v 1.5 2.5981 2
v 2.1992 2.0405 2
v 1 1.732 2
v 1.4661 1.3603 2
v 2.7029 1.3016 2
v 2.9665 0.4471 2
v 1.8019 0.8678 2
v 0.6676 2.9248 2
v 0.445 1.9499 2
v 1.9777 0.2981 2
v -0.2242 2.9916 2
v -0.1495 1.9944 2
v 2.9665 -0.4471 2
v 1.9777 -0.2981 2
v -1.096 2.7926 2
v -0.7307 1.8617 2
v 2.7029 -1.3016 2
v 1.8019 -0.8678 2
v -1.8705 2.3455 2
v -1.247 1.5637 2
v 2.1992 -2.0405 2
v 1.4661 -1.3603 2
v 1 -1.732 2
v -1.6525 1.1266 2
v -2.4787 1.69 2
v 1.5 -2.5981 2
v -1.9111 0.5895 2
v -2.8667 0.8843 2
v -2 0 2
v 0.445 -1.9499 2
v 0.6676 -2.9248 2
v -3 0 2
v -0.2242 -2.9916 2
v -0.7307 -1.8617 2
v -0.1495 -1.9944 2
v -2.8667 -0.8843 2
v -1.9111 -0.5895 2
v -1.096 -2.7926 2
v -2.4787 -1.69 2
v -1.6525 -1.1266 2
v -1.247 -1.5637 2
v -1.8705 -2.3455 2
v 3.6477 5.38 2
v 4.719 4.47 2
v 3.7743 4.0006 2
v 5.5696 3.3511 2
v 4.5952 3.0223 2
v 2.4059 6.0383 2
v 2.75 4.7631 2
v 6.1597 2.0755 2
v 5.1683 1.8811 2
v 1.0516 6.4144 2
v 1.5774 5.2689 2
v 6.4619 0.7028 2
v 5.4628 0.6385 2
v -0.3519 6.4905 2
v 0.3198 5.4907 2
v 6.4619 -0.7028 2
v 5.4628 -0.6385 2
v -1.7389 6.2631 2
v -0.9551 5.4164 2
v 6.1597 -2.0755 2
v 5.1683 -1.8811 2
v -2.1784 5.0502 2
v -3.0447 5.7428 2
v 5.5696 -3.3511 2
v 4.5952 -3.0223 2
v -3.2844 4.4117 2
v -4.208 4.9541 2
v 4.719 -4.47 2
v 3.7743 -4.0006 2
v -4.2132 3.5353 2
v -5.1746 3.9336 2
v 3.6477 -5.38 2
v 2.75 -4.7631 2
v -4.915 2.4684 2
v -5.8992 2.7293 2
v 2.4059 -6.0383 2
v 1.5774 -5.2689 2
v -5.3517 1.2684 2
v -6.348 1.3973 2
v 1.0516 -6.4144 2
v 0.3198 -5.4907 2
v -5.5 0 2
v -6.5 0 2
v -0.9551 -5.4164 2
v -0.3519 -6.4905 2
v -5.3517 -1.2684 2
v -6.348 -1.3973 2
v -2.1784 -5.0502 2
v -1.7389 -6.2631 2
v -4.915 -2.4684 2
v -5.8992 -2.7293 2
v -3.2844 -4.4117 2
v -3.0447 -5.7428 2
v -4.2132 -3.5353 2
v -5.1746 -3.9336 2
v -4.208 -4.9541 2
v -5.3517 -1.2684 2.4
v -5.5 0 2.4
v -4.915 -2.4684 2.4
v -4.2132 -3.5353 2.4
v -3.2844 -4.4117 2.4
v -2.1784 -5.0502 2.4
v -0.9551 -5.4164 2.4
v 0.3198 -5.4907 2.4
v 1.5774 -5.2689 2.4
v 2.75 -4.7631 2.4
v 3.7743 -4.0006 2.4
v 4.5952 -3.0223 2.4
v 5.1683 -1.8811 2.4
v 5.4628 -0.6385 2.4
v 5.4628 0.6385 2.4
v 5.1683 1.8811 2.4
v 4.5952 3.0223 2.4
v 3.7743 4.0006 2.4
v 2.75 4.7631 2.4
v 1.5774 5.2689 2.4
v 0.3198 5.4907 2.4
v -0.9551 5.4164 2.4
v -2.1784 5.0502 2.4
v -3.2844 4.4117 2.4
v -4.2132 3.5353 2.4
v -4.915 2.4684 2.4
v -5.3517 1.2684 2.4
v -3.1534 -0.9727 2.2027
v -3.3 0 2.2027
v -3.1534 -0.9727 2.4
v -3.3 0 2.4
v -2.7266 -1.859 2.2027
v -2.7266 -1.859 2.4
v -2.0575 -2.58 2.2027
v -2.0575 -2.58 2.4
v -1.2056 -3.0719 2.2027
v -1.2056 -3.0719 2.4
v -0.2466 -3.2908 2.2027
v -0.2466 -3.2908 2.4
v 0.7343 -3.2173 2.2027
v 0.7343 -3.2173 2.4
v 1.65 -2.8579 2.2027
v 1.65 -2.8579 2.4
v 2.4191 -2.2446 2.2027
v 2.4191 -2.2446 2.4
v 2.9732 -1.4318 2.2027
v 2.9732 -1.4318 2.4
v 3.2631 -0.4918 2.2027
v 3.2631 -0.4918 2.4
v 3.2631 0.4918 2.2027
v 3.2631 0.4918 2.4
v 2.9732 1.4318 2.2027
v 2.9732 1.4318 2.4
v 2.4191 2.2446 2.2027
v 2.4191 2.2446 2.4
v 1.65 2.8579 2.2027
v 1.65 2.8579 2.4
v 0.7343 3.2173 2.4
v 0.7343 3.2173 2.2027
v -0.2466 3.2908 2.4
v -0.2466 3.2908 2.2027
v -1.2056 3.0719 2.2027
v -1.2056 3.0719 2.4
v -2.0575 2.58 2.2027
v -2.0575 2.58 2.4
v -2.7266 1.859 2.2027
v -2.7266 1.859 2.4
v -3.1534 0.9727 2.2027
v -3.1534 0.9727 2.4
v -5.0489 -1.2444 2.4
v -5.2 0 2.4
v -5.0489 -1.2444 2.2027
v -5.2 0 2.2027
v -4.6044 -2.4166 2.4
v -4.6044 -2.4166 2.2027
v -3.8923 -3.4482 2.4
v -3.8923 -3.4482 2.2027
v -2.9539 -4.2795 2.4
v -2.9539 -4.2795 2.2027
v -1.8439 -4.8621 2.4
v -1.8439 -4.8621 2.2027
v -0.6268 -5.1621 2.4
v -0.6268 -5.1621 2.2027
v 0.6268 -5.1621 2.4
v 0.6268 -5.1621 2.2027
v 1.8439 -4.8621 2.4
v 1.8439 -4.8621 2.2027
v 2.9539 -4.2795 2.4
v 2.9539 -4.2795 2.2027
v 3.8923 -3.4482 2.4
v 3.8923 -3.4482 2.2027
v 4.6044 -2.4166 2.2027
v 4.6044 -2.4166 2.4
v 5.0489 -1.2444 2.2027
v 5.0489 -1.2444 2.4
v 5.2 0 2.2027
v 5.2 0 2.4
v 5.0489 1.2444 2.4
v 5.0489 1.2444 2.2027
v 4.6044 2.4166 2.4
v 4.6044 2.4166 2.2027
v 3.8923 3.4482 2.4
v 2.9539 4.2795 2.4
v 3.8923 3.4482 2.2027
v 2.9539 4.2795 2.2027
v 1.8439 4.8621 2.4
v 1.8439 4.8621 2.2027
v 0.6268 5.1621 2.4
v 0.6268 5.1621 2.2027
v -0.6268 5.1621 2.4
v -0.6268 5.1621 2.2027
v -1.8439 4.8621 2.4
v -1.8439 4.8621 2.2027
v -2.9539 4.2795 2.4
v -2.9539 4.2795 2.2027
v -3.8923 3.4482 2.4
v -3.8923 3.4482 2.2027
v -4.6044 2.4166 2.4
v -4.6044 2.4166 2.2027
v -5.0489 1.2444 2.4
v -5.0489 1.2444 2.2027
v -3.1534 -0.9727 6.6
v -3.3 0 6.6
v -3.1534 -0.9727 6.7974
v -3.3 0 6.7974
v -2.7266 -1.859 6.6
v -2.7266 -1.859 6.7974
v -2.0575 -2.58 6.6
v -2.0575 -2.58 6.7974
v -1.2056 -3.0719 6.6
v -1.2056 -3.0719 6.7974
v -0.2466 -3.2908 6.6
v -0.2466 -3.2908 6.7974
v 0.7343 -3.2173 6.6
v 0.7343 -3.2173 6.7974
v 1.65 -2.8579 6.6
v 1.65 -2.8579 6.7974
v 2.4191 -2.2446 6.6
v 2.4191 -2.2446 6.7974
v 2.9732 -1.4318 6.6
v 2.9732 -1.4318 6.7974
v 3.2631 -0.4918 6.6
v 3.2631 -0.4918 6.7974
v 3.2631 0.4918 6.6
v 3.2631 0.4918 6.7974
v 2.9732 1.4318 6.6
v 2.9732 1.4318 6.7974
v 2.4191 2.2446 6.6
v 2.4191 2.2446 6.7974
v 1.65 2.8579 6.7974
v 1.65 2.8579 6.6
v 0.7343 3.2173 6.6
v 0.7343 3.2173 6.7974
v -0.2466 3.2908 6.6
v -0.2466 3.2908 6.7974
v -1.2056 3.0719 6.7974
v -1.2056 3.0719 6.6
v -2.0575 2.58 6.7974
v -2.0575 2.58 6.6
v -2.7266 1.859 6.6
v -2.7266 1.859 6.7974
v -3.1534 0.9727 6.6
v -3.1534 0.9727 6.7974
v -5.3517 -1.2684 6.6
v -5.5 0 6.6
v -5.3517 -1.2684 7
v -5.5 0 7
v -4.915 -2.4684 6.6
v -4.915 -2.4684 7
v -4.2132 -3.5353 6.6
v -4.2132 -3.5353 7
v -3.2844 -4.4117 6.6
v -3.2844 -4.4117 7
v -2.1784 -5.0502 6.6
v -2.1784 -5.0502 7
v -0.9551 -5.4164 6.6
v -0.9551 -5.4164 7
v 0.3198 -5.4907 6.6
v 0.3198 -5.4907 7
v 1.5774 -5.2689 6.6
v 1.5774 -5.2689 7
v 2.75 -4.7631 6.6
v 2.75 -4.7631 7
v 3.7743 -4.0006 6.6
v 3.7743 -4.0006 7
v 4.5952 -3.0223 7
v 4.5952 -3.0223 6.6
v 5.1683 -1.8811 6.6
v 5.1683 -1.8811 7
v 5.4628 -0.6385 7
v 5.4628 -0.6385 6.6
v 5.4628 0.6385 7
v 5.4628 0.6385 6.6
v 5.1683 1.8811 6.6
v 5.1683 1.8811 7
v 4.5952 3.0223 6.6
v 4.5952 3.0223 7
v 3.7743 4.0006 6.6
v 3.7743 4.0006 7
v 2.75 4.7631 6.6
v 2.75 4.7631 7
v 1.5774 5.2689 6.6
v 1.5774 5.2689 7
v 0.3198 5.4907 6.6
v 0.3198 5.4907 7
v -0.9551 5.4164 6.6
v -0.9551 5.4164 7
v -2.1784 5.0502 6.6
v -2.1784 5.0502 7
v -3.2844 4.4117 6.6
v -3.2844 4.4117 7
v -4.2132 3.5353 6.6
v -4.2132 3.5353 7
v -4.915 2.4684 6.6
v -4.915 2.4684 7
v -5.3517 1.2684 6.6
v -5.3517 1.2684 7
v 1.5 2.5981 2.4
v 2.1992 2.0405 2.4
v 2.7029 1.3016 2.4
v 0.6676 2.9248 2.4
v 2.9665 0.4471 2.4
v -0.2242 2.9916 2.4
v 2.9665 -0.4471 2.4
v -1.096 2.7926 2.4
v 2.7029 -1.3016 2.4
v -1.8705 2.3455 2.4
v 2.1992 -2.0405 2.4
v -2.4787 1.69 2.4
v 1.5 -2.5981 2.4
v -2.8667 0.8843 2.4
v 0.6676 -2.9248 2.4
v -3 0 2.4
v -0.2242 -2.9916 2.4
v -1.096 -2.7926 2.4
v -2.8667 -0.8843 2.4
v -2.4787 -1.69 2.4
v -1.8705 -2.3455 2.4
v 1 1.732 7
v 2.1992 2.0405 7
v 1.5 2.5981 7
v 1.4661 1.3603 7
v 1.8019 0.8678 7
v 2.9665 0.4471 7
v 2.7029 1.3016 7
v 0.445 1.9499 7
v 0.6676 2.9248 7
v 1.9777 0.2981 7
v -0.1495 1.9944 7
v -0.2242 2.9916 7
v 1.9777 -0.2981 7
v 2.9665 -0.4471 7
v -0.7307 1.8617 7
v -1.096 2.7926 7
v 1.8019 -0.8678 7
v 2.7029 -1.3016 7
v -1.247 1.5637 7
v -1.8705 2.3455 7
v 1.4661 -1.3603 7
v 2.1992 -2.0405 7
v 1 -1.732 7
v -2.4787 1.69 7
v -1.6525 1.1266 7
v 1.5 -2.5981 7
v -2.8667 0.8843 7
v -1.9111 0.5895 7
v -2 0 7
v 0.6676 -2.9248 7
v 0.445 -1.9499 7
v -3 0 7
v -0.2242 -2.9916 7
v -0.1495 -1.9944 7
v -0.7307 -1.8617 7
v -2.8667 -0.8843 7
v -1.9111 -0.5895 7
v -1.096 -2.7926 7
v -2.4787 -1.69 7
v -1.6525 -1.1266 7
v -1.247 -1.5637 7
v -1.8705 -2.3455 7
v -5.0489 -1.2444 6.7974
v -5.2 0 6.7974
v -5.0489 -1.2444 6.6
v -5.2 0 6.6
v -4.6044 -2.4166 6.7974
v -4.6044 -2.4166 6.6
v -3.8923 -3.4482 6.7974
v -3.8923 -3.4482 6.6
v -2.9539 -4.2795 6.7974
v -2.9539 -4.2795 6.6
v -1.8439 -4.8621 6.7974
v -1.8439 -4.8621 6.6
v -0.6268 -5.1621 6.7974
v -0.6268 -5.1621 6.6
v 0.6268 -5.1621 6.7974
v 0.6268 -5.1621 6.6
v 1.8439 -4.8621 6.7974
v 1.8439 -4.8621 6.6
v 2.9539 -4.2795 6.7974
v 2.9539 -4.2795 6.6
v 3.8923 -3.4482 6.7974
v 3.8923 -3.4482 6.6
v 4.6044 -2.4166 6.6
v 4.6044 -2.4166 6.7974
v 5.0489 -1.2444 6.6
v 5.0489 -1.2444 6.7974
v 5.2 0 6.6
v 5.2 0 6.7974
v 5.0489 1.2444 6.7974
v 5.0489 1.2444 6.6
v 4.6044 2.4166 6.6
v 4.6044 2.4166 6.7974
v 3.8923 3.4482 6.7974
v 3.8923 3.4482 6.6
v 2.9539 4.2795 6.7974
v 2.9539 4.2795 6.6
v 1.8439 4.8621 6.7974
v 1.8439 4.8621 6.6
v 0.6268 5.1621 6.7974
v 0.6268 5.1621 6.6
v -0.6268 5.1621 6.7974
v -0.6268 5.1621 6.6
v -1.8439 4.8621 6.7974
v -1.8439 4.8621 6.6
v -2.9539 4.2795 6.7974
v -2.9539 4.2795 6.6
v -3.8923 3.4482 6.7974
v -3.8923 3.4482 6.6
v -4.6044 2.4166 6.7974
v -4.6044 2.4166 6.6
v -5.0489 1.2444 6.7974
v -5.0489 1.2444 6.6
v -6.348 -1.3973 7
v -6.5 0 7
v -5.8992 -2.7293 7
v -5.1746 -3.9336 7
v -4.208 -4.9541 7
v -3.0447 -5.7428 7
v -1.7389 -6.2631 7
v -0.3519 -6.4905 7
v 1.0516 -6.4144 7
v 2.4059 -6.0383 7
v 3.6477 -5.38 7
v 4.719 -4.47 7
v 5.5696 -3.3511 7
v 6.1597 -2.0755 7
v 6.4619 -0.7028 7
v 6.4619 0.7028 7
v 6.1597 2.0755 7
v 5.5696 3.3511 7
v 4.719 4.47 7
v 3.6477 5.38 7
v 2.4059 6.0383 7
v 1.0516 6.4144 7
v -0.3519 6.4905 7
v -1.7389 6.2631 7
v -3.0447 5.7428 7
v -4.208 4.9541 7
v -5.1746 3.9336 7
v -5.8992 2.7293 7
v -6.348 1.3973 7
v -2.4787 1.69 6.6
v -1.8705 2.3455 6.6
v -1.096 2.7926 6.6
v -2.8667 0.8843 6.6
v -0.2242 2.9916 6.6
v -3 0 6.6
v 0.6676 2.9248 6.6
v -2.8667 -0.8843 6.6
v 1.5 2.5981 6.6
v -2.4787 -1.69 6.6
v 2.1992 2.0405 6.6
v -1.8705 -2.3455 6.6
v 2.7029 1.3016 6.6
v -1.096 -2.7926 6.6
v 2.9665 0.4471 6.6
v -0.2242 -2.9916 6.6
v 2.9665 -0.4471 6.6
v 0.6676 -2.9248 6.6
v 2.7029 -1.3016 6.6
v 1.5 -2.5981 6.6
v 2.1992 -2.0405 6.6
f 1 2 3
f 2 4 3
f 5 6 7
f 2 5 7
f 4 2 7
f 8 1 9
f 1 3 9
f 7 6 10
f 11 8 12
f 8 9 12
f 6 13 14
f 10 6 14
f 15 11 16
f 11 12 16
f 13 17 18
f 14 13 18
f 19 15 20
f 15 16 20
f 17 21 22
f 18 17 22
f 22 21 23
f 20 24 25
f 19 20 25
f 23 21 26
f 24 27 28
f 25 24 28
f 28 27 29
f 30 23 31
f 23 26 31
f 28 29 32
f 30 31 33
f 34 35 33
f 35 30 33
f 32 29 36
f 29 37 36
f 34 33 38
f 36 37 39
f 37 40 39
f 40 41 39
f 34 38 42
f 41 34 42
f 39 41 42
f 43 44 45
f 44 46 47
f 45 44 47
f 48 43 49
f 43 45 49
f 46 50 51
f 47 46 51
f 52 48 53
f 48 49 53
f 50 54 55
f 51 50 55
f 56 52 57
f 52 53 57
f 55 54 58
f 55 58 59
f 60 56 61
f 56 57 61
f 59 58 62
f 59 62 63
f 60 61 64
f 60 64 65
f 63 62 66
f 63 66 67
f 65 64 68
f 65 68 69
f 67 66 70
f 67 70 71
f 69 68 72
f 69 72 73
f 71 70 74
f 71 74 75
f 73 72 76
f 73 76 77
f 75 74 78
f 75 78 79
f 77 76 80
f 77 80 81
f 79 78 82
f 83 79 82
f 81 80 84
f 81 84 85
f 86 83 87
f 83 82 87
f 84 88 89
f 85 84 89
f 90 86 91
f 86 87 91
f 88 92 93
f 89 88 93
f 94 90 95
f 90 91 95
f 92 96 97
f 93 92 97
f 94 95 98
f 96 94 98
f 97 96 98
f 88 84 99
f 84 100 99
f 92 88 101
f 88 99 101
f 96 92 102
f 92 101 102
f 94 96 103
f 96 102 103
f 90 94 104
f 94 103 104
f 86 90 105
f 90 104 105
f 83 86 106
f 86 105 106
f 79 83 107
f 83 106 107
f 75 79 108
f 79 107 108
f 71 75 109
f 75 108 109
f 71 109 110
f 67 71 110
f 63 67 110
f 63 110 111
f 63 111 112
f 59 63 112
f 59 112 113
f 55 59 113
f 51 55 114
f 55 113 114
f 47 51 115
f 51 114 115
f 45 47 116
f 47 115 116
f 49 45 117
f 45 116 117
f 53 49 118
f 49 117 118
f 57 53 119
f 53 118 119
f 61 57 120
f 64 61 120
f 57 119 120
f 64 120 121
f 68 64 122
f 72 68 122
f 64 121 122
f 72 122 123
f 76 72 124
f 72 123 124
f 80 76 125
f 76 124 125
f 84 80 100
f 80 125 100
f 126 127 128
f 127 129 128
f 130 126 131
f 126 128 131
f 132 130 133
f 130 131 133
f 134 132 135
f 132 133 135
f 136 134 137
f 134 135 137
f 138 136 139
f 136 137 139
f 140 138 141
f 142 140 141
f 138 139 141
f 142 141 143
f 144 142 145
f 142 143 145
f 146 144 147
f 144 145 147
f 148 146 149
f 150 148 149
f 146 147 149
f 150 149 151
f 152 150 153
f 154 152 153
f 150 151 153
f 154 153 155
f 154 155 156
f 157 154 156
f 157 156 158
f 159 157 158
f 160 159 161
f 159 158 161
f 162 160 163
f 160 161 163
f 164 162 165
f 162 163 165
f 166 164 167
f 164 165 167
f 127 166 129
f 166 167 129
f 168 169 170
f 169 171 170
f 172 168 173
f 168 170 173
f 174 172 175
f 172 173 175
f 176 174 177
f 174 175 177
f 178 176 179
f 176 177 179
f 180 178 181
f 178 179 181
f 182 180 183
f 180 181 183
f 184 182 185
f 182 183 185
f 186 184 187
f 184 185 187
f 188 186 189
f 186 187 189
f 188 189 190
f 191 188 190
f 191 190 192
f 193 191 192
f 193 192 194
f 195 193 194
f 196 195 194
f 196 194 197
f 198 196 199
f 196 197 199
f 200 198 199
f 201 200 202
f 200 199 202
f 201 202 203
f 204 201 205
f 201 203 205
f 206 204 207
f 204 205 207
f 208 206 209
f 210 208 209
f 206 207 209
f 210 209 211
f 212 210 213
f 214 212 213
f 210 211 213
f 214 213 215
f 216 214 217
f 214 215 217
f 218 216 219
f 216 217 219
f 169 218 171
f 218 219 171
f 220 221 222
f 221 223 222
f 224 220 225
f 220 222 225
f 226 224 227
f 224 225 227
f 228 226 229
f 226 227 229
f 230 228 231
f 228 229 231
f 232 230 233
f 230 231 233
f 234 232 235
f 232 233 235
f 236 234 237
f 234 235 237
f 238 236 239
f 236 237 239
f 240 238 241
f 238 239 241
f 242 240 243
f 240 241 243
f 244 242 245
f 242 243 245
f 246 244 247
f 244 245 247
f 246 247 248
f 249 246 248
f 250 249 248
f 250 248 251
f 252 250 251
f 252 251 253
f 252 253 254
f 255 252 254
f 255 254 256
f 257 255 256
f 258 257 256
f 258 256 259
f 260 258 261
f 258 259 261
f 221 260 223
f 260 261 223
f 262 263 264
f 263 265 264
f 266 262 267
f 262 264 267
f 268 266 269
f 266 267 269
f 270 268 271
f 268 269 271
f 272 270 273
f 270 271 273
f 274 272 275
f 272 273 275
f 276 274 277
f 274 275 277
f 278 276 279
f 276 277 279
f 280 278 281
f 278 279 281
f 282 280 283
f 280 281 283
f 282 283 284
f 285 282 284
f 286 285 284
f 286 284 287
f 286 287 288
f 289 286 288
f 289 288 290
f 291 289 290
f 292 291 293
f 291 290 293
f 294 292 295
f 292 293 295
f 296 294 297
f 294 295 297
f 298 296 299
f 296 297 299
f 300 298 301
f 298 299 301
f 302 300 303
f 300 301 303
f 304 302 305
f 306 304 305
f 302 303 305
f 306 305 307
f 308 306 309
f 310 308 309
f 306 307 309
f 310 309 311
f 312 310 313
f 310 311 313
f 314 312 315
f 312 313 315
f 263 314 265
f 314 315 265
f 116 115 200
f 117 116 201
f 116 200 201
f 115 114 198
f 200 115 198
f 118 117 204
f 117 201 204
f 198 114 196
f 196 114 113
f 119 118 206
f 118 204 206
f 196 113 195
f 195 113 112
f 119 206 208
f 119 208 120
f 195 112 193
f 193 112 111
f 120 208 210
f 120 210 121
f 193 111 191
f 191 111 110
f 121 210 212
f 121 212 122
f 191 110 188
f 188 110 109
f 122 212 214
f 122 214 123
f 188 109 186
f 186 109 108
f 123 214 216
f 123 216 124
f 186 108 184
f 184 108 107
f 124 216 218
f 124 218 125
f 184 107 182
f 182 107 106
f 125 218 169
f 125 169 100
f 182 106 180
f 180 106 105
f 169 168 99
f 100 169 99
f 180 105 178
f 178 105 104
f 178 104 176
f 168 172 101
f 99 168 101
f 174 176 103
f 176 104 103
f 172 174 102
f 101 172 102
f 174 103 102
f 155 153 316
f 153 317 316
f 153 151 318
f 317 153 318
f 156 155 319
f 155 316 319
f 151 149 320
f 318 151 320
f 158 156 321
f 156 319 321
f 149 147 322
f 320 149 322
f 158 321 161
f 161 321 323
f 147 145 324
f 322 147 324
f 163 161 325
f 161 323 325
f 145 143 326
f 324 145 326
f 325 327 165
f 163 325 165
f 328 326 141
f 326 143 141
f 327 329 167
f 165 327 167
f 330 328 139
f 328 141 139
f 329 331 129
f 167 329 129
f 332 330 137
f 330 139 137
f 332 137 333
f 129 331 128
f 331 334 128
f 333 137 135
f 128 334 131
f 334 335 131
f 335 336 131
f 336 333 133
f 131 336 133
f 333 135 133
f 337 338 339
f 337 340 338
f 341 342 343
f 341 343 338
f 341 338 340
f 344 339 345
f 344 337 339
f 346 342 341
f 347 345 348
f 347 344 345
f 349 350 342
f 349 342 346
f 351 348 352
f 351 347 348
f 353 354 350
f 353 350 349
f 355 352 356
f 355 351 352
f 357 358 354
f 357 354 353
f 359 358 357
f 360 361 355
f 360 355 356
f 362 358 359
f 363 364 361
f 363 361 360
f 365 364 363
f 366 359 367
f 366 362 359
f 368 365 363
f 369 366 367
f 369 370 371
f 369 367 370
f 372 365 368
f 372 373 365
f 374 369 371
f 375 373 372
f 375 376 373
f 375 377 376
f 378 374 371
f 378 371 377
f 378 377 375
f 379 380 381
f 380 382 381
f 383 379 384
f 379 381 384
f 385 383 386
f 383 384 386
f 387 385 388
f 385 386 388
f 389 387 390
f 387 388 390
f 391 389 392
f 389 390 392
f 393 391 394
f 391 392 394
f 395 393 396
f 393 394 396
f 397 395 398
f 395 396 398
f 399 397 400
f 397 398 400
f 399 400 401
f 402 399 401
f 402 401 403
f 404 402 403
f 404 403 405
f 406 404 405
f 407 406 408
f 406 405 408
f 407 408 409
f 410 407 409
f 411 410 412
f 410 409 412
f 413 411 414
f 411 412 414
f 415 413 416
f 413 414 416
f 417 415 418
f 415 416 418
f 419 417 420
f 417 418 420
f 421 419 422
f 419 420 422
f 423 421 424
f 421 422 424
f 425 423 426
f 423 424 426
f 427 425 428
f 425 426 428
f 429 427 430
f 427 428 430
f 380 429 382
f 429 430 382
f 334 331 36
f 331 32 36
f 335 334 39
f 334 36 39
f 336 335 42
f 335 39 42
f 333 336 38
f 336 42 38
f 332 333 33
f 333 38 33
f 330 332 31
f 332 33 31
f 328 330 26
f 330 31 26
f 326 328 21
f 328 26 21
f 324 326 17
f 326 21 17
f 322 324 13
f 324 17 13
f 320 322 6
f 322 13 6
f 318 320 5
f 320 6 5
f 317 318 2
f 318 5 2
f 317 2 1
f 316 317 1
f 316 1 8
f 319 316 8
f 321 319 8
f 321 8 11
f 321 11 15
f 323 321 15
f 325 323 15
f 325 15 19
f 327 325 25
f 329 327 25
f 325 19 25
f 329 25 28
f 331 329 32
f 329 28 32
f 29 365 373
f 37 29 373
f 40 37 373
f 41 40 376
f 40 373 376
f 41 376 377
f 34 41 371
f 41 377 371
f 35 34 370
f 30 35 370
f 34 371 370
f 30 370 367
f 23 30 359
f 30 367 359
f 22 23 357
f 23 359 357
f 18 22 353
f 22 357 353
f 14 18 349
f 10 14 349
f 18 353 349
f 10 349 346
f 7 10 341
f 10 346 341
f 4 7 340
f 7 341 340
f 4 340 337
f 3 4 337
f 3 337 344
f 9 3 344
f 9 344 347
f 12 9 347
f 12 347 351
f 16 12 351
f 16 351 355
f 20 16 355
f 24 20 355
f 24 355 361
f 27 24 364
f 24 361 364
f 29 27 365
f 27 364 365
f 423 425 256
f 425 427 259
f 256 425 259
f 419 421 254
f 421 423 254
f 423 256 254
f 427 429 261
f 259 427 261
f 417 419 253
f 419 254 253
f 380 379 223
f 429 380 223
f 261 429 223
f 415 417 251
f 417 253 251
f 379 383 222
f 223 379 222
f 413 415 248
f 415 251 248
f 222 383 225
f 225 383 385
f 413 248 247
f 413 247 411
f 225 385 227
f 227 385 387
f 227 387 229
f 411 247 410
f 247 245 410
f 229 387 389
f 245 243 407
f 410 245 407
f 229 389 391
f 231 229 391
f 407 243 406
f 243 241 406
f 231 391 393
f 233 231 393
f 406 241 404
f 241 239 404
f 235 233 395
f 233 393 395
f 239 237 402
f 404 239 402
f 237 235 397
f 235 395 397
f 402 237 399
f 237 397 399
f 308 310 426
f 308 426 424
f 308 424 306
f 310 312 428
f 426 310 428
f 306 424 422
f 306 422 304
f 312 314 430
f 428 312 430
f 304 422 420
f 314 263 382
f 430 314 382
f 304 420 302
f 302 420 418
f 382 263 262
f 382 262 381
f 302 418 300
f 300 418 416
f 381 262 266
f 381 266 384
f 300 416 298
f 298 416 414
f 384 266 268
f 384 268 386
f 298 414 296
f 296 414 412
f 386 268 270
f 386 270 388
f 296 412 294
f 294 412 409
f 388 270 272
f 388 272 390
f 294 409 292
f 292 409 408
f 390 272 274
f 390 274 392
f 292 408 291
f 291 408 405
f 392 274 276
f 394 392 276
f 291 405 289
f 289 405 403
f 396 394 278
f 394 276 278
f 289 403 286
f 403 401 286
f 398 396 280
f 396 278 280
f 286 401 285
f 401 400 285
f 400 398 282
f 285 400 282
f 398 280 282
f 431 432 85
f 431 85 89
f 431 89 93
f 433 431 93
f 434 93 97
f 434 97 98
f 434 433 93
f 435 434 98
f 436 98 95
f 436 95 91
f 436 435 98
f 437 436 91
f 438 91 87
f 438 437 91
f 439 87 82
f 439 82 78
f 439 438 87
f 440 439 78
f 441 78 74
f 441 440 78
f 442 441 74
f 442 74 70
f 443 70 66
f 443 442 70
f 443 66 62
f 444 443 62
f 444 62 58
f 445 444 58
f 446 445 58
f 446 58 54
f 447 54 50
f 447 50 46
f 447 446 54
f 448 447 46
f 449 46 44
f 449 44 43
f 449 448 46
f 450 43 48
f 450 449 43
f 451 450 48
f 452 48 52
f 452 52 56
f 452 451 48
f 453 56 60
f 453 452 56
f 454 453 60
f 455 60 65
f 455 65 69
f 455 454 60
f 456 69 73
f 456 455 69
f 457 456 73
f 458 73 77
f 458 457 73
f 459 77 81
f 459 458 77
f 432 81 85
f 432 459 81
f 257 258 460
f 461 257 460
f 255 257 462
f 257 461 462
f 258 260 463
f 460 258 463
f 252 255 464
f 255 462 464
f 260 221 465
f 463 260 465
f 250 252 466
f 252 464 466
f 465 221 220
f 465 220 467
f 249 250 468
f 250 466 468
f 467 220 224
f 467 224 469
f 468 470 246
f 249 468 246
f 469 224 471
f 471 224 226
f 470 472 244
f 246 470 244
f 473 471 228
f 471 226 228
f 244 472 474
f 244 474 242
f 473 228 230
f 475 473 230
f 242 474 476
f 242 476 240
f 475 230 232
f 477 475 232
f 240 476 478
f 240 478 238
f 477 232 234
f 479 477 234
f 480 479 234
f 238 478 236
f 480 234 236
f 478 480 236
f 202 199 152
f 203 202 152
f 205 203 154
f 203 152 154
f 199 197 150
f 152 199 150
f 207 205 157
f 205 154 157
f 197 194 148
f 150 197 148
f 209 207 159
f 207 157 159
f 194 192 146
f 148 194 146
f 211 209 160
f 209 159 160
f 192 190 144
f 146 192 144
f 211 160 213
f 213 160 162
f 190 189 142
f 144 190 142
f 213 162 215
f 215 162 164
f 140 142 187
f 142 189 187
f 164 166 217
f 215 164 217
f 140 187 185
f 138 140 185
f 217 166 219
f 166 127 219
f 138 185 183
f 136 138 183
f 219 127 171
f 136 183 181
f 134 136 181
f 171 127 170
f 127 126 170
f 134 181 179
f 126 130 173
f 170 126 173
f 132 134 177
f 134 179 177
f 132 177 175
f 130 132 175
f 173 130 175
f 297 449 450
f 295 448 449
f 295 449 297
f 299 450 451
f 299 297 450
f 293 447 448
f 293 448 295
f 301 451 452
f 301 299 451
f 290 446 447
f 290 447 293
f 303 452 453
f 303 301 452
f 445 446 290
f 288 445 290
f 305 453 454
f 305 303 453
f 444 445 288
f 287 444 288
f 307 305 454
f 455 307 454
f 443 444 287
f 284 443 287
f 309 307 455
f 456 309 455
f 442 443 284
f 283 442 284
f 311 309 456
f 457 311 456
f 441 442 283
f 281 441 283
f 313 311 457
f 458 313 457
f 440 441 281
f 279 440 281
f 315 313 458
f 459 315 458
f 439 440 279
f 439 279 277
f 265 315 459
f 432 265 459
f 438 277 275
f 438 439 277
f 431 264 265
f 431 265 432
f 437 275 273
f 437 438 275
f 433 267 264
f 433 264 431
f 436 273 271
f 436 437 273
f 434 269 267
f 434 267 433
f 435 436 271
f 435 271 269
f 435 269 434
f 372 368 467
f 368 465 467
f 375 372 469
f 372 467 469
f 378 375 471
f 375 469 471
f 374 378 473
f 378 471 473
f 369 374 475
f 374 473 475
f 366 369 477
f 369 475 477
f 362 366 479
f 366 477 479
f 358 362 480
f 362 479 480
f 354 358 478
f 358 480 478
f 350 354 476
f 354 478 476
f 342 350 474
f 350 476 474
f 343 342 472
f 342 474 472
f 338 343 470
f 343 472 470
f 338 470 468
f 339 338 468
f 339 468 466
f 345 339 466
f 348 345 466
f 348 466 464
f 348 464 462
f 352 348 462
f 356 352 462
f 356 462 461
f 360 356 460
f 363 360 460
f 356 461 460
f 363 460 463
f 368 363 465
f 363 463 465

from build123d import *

# Parameters (mm, degrees)
SKETCH1_R           = 6.4999997
SKETCH1_R_2         = 1.999996
BOSS_EXTRUDE1_DEPTH = 4.99999


with BuildPart() as part:
    # Sketch1 → Boss-Extrude1 (new body)
    with BuildSketch(Plane.XY.offset(7)):
        with Locations(Location((0, 0, 0), (0, 0, 180))):
            Circle(SKETCH1_R)
        with Locations(Location((0, 0, 0), (0, 0, 180))):
            Circle(SKETCH1_R_2, mode=Mode.SUBTRACT)
    extrude(amount=-BOSS_EXTRUDE1_DEPTH)

    # Sketch4 → Cut-Revolve1 (revolve, cut)
    with BuildSketch(Plane(origin=(0, 0, 0), x_dir=(1, 0, 0), z_dir=(0, 1, 0)), mode=Mode.PRIVATE) as cut_revolve1_sk:
        Polygon((2.99999654, -2.4000092), (2.99999654, -2.00001), (5.49999916, -2.00001), (5.49999916, -2.4000092), (5.19999976, -2.4000092), (5.19999976, -2.202656618), (3.29999594, -2.202656618), (3.29999594, -2.4000092), align=None)
        Polygon((5.49999916, -7), (2.99999654, -7), (2.99999654, -6.6000008), (3.29999594, -6.6000008), (3.29999594, -6.797353382), (5.19999976, -6.797353382), (5.19999976, -6.6000008), (5.49999916, -6.6000008), align=None)
    revolve(cut_revolve1_sk.sketch.rotate(Axis((0, 0, 2.00001), (0, 0, 1)), 180), axis=Axis((0, 0, 2.00001), (0, 0, 1)), mode=Mode.SUBTRACT)


solid = part.part
